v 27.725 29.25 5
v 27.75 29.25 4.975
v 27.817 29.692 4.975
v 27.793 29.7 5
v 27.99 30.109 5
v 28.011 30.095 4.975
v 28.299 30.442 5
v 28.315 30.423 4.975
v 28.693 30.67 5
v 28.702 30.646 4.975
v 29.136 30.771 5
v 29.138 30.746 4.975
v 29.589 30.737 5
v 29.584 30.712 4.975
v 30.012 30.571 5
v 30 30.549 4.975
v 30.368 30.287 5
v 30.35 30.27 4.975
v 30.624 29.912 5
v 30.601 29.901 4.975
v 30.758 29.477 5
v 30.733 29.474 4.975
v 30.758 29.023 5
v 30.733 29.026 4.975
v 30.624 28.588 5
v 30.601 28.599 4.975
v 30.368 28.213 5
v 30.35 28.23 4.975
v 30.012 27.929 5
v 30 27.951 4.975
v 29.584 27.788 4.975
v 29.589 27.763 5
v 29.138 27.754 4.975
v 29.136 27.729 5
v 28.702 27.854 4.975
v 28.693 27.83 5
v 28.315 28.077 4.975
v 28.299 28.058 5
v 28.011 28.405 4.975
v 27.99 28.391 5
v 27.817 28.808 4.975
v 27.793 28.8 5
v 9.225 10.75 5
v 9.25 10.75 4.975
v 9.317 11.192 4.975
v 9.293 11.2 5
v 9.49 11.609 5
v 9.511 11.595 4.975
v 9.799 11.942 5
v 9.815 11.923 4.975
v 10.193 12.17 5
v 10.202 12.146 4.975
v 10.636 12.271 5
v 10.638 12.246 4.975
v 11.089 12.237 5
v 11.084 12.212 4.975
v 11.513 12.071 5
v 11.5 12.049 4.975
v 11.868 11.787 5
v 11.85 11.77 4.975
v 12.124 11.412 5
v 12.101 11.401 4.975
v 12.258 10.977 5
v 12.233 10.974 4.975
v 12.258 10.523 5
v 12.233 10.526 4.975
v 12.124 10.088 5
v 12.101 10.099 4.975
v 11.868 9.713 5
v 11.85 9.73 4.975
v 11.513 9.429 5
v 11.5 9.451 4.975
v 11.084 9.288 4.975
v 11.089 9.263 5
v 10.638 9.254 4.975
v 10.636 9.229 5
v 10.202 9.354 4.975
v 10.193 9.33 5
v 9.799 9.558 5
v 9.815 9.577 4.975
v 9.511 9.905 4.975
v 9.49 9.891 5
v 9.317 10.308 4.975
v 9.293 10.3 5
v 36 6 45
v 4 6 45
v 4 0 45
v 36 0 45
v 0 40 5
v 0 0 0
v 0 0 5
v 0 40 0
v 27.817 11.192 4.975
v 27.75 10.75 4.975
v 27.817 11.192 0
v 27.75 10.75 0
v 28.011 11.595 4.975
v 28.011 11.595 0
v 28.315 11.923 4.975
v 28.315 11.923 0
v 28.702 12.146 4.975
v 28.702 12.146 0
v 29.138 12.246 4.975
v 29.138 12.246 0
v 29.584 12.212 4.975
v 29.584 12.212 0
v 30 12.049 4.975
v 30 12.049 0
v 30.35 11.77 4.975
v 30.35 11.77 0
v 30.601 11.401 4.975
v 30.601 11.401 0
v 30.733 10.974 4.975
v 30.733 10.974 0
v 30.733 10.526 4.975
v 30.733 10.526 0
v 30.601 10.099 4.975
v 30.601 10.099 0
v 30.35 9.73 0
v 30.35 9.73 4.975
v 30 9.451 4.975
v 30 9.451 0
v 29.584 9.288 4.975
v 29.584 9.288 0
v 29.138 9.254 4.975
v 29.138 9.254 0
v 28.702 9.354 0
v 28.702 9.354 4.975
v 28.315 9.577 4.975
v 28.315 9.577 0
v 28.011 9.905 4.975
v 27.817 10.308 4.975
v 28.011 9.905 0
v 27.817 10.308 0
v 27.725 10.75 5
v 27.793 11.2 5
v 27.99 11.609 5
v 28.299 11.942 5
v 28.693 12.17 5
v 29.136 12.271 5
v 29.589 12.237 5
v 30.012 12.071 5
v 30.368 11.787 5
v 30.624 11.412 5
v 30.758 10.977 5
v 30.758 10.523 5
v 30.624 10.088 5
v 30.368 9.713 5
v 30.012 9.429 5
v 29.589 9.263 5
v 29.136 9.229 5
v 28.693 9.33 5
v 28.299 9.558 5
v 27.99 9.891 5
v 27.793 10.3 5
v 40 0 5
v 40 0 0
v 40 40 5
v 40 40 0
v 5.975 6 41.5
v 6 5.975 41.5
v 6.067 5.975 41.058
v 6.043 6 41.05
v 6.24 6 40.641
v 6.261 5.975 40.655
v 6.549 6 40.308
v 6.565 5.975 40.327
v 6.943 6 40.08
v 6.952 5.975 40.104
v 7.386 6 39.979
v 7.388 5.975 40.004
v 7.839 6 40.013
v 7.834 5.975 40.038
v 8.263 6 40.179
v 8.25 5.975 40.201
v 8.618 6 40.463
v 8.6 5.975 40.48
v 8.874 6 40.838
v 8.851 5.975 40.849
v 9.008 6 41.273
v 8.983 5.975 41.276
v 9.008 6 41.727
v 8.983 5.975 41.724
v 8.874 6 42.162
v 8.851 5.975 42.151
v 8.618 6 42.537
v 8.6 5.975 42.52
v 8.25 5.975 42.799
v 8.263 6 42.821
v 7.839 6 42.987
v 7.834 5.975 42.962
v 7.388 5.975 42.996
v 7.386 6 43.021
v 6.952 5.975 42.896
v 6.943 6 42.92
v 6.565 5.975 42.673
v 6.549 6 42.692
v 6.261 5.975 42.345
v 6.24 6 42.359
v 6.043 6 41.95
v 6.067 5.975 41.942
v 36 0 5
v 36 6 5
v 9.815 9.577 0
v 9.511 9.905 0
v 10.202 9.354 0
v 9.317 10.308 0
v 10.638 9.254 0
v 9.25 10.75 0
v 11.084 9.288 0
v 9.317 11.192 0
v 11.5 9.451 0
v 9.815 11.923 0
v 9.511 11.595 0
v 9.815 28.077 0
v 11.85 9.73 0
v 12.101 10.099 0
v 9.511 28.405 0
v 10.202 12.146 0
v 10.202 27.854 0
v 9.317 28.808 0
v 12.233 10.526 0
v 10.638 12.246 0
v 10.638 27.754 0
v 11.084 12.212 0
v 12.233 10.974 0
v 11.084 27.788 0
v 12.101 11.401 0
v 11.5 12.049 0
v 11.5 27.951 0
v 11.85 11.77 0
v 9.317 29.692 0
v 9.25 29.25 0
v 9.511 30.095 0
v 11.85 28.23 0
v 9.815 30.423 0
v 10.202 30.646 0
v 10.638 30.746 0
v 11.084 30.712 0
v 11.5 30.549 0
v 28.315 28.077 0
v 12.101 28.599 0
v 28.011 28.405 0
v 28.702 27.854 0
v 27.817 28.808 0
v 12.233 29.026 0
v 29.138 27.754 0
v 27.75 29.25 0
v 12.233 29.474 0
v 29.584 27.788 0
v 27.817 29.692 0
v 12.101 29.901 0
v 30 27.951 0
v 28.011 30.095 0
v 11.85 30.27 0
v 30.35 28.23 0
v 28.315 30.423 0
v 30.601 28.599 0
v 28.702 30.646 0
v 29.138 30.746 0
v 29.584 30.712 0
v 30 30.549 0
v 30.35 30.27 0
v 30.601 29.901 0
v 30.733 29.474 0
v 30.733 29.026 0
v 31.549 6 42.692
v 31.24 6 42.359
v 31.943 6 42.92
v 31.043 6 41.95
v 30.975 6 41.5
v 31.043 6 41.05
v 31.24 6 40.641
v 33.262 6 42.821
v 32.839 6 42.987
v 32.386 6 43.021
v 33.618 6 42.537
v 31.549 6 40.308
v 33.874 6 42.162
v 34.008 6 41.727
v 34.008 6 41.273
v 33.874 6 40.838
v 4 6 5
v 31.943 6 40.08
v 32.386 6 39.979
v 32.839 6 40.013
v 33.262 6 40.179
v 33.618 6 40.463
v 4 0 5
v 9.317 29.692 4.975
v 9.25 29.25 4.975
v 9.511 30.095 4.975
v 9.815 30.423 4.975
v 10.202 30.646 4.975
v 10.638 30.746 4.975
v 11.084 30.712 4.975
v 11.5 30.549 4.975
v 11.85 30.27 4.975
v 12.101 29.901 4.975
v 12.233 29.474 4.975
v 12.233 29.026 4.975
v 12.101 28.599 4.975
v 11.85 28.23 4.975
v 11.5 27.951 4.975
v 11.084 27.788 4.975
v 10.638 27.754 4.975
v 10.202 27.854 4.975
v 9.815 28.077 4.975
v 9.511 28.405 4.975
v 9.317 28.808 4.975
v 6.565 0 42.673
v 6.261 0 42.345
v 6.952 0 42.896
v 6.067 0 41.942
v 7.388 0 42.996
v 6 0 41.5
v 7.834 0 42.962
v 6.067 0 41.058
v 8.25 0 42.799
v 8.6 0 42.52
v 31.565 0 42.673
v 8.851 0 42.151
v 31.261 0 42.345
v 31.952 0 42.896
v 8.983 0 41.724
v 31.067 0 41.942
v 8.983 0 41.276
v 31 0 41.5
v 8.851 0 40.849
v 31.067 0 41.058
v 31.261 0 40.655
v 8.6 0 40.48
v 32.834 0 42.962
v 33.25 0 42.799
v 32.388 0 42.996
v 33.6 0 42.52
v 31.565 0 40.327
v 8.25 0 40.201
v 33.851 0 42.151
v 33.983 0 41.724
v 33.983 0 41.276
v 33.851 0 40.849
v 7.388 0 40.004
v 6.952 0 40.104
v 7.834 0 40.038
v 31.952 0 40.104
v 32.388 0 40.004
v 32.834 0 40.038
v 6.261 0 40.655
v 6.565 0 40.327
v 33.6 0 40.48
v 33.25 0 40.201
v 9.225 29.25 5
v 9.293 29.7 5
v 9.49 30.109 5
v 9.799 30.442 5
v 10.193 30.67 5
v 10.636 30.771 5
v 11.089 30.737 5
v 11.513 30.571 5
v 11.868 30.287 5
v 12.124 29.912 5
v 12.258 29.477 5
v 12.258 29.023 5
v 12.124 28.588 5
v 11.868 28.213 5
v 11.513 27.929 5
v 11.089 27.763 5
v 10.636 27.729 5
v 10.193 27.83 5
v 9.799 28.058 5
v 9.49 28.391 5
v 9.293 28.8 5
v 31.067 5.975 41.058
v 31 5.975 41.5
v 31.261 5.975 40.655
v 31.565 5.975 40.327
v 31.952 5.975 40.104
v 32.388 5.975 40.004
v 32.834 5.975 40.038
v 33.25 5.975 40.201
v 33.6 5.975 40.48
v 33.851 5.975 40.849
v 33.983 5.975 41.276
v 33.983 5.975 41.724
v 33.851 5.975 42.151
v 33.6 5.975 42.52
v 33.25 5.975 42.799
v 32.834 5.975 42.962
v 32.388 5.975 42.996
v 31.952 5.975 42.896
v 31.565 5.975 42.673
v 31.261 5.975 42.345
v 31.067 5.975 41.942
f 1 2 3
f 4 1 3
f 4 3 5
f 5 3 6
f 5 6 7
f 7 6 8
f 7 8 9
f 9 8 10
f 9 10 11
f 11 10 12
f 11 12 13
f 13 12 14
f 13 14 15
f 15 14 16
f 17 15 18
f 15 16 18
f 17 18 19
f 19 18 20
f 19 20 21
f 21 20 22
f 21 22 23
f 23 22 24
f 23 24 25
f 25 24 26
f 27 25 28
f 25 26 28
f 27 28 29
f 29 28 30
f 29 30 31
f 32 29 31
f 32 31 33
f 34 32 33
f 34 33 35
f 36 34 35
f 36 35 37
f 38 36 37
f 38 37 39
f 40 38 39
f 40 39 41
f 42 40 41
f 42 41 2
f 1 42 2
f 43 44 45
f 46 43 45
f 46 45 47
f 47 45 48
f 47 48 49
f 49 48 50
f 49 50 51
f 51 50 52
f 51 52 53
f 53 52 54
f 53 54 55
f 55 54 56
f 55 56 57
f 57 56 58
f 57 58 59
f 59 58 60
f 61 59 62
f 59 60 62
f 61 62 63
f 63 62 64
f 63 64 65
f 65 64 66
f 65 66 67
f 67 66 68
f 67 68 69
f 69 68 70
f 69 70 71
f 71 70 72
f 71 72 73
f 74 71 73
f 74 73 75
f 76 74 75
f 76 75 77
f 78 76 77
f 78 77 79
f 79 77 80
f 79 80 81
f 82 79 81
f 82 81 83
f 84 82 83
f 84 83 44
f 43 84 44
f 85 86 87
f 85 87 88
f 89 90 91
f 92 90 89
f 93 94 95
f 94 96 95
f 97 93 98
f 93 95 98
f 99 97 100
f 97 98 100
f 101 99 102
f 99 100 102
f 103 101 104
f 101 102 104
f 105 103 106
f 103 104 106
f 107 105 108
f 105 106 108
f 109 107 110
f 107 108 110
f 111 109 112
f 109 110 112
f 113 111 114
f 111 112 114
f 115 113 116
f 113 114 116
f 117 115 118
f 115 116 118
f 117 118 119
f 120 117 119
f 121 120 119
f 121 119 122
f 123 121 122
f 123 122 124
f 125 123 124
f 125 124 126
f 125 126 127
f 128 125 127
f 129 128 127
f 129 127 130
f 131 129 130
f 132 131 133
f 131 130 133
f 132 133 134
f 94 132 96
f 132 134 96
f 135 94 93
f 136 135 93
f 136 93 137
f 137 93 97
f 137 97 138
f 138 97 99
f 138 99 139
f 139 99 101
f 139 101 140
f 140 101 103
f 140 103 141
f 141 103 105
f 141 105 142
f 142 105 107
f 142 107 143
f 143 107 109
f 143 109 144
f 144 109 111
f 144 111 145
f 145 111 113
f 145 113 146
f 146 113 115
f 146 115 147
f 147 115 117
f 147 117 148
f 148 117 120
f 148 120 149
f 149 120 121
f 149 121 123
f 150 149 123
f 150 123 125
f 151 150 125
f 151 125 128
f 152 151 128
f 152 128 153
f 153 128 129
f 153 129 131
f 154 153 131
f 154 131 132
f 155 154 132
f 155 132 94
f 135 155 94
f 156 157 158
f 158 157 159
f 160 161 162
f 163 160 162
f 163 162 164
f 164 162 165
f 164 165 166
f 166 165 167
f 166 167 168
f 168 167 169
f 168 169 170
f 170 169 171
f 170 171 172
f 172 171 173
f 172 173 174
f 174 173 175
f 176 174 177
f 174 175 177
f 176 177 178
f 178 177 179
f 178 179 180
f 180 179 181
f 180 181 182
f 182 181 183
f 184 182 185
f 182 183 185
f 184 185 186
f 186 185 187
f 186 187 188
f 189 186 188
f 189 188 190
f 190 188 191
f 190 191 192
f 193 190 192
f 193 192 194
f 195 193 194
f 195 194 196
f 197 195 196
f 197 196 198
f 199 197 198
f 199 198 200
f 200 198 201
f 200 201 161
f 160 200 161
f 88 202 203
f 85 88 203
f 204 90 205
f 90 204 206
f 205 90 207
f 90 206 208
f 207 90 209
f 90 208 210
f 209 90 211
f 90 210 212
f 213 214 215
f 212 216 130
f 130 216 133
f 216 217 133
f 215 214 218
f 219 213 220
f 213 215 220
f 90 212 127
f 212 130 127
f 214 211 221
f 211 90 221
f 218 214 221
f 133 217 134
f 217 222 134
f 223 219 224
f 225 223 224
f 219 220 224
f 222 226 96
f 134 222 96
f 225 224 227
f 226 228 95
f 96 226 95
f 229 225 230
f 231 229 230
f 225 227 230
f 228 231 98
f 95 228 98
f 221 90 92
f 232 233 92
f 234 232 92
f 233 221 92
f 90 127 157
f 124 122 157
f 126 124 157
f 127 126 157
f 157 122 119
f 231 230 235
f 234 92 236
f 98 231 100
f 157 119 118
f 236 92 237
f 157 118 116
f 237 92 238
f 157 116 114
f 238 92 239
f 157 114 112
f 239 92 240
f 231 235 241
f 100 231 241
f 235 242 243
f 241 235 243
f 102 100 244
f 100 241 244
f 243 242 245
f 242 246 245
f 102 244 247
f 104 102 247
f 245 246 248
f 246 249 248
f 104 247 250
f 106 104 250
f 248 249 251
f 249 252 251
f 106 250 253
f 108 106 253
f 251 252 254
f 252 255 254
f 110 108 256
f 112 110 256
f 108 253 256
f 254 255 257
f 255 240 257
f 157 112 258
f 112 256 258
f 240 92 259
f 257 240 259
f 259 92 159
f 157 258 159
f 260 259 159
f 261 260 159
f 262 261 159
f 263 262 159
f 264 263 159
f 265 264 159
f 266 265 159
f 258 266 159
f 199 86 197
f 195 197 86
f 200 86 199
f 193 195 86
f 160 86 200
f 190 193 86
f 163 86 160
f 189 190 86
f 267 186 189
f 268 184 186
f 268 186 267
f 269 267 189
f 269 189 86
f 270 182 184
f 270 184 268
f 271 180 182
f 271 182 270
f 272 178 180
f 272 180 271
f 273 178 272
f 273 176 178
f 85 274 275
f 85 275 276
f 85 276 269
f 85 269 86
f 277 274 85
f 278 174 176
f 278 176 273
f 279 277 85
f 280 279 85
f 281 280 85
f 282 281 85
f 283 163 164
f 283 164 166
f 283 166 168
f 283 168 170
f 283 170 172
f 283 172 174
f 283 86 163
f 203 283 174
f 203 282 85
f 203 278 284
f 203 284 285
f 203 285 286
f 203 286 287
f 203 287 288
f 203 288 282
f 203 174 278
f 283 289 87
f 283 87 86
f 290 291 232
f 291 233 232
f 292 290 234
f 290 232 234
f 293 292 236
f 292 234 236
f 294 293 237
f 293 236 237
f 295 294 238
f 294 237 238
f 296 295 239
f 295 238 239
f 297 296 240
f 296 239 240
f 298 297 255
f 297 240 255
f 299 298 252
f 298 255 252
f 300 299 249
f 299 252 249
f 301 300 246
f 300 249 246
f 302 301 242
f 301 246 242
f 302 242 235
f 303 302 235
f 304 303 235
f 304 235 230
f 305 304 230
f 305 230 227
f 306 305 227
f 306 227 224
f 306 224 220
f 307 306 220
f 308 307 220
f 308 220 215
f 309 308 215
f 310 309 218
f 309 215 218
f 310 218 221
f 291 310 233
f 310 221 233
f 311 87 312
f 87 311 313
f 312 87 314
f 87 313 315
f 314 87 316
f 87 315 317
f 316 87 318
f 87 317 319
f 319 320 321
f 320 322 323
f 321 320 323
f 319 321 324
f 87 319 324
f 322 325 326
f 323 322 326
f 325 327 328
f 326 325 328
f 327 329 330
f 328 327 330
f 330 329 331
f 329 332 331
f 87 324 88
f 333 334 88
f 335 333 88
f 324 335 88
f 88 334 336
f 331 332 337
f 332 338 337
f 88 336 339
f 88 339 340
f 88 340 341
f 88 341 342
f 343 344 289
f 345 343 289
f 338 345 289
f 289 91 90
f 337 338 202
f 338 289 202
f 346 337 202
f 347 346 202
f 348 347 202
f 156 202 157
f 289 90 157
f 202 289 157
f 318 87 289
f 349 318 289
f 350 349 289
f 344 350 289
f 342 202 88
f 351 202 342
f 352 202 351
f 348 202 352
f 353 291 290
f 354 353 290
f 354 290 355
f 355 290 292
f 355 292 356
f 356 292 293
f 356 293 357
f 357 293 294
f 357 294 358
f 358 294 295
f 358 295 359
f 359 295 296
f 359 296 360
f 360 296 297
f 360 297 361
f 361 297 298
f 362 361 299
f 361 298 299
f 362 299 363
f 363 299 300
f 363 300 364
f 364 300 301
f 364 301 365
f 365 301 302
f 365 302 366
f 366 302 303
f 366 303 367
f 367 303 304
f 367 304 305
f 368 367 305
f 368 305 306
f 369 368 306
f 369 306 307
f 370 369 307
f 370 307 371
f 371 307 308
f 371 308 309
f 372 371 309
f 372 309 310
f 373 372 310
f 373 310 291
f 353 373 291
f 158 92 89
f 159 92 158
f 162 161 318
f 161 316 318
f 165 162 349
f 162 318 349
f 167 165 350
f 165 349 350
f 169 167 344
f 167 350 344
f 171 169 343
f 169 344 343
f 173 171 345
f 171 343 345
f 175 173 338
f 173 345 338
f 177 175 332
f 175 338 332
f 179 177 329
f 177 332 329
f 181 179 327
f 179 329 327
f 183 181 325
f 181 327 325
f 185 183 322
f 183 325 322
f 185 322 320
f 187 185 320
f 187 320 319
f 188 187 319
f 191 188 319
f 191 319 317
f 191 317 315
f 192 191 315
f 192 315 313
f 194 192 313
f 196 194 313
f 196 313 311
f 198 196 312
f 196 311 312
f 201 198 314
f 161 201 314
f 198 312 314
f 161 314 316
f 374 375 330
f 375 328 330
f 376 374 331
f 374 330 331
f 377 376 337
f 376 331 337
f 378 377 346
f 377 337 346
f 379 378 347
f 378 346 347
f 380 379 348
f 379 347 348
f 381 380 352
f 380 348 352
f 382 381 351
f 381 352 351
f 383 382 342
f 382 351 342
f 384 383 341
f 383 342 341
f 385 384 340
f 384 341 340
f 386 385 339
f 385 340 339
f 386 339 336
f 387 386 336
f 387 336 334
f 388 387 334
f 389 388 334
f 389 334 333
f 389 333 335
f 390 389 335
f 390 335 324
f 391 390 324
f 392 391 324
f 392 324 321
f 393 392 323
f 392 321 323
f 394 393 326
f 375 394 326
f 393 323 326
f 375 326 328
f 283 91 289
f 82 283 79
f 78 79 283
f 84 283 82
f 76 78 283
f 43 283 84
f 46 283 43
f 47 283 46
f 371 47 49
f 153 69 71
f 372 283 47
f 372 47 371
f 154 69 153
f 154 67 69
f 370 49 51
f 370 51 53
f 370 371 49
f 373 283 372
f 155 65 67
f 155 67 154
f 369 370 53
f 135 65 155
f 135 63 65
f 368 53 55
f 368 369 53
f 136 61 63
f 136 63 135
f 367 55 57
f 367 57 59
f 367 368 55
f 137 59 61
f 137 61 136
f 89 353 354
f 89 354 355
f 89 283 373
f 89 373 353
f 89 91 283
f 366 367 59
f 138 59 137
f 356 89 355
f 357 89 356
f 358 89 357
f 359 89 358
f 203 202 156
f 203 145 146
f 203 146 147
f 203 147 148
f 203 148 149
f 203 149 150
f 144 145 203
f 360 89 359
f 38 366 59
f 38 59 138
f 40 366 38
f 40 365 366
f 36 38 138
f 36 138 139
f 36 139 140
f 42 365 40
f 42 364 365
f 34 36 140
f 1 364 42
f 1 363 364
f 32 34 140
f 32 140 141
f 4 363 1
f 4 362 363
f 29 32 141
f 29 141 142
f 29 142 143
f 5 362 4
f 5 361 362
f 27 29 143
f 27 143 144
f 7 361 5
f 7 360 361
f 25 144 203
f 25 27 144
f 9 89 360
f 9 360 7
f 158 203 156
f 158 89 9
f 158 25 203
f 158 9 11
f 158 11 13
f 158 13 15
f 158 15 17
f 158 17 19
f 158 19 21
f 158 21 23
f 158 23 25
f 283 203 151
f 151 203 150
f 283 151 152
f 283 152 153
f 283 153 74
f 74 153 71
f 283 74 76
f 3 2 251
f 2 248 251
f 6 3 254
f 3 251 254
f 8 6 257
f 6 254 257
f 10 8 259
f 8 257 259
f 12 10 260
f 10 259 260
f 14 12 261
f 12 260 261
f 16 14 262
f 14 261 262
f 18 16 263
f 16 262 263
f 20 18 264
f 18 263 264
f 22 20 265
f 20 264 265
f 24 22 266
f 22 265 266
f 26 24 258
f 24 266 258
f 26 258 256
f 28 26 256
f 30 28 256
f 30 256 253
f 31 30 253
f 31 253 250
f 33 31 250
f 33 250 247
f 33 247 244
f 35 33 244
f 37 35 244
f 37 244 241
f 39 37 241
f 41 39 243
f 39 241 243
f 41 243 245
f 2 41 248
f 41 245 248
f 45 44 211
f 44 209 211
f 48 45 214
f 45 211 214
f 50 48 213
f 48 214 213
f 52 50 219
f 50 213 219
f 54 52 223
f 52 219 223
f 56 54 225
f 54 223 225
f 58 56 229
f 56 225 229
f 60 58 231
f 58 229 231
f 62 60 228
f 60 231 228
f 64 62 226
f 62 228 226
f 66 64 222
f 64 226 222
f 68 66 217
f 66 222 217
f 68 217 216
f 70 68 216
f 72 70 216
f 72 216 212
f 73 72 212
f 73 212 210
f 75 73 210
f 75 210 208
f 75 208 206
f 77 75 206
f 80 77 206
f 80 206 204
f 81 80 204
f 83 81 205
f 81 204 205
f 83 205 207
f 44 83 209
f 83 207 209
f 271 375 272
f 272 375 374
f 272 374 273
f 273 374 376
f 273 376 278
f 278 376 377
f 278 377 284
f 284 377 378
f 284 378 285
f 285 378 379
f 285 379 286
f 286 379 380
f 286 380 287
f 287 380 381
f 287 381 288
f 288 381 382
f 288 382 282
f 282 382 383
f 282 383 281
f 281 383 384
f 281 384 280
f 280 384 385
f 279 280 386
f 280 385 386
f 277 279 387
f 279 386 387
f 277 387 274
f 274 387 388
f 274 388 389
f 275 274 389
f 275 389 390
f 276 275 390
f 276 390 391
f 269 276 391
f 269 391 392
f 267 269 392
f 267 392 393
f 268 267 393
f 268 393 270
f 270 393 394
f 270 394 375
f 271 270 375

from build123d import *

# Parameters (mm, degrees)
SZKIC1_W                             = 40
SZKIC1_H                             = 40
DODANIE_WYCI_GNI_CIE1_DEPTH          = 5
OTWORY_USTALAJ_CE_3_0MM1_D           = 3
OTWORY_USTALAJ_CE_3_0MM1_CSINK_D     = 3.05
OTWORY_USTALAJ_CE_3_0MM1_CSINK_ANGLE = 90
SZKIC4_W                             = 32
SZKIC4_H                             = 6
DODANIE_WYCI_GNI_CIE2_DEPTH          = 40
OTWORY_USTALAJ_CE_3_0MM2_D           = 3
OTWORY_USTALAJ_CE_3_0MM2_CSINK_D     = 3.05
OTWORY_USTALAJ_CE_3_0MM2_CSINK_ANGLE = 90


with BuildPart() as part:
    # Szkic1 → Dodanie-wyciągnięcie1 (new body)
    with BuildSketch(Plane.XY):
        with Locations((20, 20)):
            Rectangle(SZKIC1_W, SZKIC1_H)
    extrude(amount=DODANIE_WYCI_GNI_CIE1_DEPTH)

    # Otwory ustalające Ø3.0mm1 (through all)
    with Locations(Plane.XY.offset(5)):
        with Locations((10.75, 29.25), (29.25, 29.25), (10.75, 10.75), (29.25, 10.75)):
            CounterSinkHole(OTWORY_USTALAJ_CE_3_0MM1_D / 2, OTWORY_USTALAJ_CE_3_0MM1_CSINK_D / 2, counter_sink_angle=OTWORY_USTALAJ_CE_3_0MM1_CSINK_ANGLE)

    # Szkic4 → Dodanie-wyciągnięcie2 (add)
    with BuildSketch(Plane.XY.offset(5)):
        with Locations((20, 3)):
            Rectangle(SZKIC4_W, SZKIC4_H)
    extrude(amount=DODANIE_WYCI_GNI_CIE2_DEPTH)

    # Otwory ustalające Ø3.0mm2 (through all)
    with Locations(Plane(origin=(0, 6, 0), x_dir=(1, 0, 0), z_dir=(0, 1, 0))):
        with Locations((7.5, -41.5), (32.5, -41.5)):
            CounterSinkHole(OTWORY_USTALAJ_CE_3_0MM2_D / 2, OTWORY_USTALAJ_CE_3_0MM2_CSINK_D / 2, counter_sink_angle=OTWORY_USTALAJ_CE_3_0MM2_CSINK_ANGLE)


solid = part.part
